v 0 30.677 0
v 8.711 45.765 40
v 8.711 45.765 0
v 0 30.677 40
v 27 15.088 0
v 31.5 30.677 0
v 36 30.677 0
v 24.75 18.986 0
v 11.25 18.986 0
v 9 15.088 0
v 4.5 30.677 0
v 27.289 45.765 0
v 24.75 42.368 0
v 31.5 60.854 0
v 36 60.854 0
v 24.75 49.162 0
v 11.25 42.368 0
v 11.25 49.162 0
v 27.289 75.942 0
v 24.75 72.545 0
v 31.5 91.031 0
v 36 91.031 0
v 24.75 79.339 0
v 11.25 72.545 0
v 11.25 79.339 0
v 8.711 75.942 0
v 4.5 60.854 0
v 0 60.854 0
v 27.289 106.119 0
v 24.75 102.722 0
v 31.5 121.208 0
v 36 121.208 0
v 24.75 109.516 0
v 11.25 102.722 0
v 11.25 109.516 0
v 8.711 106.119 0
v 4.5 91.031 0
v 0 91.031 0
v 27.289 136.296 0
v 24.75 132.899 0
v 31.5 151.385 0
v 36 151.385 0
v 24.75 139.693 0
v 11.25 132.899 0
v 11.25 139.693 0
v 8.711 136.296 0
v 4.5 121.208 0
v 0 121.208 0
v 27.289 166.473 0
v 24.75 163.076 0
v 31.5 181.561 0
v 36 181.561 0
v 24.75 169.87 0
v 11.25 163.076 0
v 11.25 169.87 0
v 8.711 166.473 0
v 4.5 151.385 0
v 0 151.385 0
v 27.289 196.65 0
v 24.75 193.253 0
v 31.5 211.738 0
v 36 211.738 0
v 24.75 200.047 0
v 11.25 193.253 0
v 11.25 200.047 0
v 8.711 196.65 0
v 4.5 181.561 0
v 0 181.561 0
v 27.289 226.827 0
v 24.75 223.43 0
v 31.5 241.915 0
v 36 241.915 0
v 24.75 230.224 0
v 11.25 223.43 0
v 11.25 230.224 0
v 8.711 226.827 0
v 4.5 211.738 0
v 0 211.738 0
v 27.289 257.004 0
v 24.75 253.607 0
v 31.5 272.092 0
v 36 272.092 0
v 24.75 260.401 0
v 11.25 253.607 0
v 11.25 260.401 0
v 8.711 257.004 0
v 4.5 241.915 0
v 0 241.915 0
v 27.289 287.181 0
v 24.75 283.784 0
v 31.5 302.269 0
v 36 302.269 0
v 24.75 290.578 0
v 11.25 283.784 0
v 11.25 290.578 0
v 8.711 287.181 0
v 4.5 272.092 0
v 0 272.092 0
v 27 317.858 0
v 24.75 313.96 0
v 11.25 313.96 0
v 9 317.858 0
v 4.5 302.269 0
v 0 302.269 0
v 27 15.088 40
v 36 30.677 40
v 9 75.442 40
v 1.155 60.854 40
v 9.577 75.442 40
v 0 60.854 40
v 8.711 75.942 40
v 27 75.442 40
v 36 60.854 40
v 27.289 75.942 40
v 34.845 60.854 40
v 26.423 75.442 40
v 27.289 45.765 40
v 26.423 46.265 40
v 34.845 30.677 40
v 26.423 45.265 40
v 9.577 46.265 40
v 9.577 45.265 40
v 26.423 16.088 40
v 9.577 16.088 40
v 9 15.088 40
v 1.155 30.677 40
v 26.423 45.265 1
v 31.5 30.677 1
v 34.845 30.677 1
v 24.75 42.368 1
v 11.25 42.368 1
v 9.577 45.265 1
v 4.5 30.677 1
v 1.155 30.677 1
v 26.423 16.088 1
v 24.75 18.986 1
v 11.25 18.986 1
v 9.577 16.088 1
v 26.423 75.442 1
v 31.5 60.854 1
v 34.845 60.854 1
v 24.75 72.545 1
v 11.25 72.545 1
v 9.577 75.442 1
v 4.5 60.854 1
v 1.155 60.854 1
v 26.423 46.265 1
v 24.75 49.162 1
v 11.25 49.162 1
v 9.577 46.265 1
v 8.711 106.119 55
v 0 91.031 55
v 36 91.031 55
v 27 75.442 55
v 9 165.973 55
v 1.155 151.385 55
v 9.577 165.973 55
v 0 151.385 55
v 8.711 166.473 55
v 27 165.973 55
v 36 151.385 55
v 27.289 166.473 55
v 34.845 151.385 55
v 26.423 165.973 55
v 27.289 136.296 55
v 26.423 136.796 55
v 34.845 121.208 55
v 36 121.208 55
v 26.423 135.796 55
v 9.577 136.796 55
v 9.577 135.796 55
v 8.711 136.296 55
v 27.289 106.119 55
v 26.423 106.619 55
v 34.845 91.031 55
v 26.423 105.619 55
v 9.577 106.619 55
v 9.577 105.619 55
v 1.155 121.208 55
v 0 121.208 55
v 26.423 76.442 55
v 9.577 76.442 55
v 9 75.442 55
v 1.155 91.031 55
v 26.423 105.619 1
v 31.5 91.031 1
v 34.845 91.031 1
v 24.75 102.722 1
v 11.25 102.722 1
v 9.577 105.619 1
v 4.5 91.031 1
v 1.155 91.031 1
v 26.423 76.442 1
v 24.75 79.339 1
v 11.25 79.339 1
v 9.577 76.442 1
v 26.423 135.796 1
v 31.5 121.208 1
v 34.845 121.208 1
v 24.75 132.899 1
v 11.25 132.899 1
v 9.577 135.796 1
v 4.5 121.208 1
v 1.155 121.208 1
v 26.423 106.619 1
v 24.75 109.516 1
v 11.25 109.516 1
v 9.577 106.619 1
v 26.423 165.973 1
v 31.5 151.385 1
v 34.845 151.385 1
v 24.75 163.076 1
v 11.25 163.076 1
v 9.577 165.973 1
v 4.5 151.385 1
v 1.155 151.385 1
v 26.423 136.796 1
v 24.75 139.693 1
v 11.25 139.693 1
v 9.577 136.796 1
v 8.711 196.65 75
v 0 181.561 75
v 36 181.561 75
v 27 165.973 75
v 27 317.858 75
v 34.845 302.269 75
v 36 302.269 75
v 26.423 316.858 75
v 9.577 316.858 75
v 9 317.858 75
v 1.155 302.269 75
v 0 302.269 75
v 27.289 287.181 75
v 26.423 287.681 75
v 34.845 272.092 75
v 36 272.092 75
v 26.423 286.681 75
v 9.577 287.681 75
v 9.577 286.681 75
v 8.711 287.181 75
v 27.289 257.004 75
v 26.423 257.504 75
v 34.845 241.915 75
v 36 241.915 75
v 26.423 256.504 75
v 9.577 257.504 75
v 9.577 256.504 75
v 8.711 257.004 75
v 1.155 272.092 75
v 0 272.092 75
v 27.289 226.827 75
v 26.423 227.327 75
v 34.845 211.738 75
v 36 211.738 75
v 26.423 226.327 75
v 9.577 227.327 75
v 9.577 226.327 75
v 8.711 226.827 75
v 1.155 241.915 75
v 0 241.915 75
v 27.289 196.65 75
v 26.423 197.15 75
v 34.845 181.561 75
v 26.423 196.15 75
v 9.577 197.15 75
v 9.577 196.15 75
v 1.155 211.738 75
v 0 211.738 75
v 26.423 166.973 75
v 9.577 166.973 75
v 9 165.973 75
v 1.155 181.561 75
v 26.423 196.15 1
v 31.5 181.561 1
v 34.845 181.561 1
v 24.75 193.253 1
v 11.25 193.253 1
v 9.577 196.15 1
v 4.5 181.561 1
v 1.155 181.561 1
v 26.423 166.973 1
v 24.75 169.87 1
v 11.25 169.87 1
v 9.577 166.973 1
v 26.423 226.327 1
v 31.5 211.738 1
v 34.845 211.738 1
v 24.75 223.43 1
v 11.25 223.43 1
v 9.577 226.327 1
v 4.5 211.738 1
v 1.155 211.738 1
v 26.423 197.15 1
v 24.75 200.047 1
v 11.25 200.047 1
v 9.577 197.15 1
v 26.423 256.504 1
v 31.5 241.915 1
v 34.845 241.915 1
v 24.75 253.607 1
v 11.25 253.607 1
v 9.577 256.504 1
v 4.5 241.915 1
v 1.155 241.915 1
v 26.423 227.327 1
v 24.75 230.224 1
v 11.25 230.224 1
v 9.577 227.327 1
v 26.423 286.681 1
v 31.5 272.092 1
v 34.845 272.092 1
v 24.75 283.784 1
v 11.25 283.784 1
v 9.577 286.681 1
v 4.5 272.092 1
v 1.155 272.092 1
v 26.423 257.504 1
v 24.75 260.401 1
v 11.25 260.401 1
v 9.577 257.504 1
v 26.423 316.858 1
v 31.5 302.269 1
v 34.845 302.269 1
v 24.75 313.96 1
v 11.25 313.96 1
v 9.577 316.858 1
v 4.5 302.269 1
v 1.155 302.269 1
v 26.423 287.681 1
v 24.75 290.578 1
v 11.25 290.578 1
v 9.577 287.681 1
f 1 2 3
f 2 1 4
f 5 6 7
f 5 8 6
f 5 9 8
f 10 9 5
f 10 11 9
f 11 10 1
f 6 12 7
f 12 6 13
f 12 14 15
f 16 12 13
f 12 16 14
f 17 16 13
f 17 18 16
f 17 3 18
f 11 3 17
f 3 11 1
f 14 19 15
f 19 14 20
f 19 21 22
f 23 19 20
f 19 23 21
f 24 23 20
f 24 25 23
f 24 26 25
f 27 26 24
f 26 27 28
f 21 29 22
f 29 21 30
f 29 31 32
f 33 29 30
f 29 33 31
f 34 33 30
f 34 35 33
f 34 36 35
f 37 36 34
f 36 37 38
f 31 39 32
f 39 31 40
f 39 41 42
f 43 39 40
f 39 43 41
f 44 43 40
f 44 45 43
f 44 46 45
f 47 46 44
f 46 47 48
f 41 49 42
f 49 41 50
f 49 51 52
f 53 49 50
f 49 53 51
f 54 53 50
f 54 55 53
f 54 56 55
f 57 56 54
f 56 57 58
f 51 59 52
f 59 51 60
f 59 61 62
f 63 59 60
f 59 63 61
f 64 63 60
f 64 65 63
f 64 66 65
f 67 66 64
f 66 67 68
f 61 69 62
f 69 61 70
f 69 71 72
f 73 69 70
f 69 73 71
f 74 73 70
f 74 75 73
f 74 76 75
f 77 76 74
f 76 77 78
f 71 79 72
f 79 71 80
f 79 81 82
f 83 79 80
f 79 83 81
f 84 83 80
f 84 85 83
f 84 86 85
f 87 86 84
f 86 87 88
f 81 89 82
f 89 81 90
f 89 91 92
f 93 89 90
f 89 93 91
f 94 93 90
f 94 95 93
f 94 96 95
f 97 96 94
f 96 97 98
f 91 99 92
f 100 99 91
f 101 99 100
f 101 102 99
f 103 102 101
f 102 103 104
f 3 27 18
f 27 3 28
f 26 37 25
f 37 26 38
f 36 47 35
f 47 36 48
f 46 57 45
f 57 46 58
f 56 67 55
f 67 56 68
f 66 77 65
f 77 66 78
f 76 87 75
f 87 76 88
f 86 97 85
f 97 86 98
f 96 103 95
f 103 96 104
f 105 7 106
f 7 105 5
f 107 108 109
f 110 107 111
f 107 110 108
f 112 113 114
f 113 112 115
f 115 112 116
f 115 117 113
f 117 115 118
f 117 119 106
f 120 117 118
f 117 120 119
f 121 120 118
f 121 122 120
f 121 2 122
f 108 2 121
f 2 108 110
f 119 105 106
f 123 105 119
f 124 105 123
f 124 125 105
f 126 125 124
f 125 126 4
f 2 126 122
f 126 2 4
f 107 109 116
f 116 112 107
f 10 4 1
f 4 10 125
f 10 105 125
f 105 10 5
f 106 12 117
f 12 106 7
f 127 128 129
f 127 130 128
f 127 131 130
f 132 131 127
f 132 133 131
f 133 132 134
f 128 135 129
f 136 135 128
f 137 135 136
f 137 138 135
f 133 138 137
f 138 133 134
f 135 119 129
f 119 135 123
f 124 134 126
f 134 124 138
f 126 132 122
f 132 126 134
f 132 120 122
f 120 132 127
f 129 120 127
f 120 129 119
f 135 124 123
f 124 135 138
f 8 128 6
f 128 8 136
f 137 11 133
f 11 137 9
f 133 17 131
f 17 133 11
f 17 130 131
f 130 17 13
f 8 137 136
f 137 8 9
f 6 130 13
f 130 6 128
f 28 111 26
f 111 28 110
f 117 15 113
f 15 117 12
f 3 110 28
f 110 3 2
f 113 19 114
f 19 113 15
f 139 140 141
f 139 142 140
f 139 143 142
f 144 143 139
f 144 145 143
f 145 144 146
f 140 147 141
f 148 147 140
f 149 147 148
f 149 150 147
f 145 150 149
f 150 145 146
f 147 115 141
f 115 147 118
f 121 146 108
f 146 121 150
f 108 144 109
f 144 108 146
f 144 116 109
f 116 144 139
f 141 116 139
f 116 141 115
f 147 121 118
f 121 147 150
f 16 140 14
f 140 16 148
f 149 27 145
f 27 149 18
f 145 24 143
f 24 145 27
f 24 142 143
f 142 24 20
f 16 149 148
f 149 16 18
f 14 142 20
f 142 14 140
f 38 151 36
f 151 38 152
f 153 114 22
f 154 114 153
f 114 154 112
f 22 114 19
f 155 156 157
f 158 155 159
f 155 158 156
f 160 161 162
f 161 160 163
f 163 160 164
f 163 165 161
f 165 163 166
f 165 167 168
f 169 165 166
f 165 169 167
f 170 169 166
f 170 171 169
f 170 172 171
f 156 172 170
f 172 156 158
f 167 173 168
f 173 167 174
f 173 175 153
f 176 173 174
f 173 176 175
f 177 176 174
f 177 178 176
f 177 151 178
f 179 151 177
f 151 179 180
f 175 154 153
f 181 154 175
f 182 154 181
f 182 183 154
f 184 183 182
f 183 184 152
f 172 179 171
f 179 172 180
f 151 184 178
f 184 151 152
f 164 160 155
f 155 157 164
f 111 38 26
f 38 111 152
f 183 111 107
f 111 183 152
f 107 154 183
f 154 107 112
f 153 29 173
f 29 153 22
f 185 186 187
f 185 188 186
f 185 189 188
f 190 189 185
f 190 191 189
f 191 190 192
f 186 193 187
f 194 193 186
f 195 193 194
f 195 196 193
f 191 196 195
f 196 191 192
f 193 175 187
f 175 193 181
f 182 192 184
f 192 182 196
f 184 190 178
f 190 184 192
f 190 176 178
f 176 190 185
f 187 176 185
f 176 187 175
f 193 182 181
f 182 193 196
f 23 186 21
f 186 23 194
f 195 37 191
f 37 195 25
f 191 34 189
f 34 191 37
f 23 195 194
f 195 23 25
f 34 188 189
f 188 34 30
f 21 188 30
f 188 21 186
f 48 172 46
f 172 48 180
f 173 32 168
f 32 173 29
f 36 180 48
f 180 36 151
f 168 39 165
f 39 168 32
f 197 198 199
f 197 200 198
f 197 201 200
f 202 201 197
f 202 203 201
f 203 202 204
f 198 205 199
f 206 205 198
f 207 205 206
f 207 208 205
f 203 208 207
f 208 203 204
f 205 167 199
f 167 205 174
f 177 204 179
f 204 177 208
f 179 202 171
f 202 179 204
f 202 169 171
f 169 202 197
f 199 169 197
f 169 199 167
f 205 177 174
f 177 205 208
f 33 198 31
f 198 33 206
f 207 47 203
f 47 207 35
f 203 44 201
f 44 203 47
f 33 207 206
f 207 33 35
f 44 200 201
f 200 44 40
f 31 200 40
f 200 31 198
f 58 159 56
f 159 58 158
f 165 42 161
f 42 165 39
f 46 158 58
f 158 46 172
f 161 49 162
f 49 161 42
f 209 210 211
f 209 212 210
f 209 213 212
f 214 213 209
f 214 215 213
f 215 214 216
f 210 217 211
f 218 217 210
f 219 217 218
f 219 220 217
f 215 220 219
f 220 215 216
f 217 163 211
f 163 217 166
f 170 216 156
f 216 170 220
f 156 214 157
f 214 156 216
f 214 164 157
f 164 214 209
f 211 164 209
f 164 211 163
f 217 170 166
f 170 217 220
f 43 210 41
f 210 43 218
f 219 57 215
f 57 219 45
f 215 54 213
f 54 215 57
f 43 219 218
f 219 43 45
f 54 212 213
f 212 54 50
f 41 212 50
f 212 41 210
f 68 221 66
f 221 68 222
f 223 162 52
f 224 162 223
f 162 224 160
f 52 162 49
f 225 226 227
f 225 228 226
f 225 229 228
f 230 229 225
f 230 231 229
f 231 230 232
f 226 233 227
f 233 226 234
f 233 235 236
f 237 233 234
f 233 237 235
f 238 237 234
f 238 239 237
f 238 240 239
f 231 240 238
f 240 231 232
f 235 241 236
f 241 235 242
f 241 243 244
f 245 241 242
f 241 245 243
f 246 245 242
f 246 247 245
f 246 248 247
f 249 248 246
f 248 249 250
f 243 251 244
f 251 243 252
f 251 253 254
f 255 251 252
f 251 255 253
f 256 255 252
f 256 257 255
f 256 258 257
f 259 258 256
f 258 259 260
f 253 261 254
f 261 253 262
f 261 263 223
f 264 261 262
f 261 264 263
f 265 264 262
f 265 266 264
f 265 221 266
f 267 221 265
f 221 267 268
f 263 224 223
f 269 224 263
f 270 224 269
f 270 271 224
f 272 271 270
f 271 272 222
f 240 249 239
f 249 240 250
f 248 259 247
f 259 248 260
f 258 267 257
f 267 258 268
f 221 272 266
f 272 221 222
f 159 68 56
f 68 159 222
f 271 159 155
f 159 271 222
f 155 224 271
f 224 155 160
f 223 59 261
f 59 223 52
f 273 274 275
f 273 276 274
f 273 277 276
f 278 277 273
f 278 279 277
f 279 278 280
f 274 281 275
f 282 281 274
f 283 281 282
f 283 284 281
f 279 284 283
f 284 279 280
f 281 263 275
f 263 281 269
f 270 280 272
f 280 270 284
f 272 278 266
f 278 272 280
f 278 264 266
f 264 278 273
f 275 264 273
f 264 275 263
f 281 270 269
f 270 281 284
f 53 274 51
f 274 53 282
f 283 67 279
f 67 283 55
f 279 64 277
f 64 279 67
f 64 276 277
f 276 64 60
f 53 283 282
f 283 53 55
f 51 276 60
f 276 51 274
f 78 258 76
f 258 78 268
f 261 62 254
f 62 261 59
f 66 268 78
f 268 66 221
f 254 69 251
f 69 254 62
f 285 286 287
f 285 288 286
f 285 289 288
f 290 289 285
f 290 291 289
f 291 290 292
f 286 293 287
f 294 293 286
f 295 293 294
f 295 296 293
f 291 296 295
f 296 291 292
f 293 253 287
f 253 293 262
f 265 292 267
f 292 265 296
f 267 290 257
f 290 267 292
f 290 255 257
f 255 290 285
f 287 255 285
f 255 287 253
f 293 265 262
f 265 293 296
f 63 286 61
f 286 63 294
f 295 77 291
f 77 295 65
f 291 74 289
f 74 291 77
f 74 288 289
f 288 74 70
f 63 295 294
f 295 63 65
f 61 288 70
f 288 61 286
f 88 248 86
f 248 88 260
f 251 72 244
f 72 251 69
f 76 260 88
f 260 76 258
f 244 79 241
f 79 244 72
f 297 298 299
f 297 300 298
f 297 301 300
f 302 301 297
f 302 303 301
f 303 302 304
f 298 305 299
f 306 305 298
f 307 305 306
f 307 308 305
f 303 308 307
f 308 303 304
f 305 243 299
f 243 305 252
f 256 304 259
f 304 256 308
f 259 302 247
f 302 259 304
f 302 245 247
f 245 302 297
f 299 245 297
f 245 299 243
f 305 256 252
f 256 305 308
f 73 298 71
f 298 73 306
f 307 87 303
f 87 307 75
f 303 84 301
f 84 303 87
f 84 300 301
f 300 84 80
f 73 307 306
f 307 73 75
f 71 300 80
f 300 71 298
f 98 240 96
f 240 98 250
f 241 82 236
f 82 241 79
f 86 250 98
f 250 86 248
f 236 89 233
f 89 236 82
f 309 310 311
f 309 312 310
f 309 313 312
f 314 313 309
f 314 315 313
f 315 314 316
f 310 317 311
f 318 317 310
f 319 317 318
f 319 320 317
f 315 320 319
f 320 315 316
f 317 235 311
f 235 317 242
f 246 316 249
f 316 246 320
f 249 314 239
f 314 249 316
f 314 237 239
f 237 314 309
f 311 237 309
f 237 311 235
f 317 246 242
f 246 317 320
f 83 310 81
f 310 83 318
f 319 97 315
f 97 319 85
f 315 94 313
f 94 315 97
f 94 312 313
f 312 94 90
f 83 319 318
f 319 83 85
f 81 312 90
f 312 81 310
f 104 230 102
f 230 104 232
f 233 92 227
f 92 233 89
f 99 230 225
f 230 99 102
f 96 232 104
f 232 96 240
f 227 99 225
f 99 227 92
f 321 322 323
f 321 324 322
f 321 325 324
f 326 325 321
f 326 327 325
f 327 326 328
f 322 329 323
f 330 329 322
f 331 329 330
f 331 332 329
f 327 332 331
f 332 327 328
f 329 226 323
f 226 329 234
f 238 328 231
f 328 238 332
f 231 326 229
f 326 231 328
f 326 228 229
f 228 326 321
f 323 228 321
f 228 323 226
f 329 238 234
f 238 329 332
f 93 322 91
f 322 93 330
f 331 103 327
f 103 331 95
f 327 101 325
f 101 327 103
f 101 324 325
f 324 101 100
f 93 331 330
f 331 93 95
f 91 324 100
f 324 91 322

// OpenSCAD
/* ************************************************************
   * Author: Peter Oehlert
   * Copyright 2017
   * 
   * 
   * This work is licensed under a Creative Commons 
   * Attribution-NonCommercial-ShareAlike 4.0 International 
   * License.
   ***********************************************************/

Side = 18;
Wall = 1;
BottomCutout = Side*.75;

ConfigArray = [
    [true],
    [true],
    [true],
    [true],
    [true],
    [true],
    [true],
    [true],
    [true],
    [true],
];

HeightArray = [
    [75],
    [75],
    [75],
    [75],
    [75],
    [55],
    [55],
    [55],
    [40],
    [40],
];


// --------------------------------------------------------
// - Do not modify constants below this line
// --------------------------------------------------------

Cos0 = 1;
// Using degrees, PI = 180 degrees
Pi = 180;
TwoPi = 2*Pi;
Unit = TwoPi/6; // we're a hexagon

// from SOHCAHTOA, wall is the actual wall, so 
// wall/sin(Unit) is the amount of the radius different
// between the circle enclosing the outside hexagon and 
// the circle enclosing the inside hexagon
RadiusDifference = (Wall/sin(Unit));

function reverse(array) = 
    let(arrLen = len(array)-1)
    [ for (i = [0:arrLen]) array[arrLen-i] ];


// get hex polygon points, using unit circle
function rawHexPoints(side) = [
    for (idx = [0:6]) 
        side *[ cos( TwoPi/6 * idx ), sin( TwoPi/6 * idx ) ] 
];
    
 // get translation vector to originate at 0,0
 function translateRawHex(points) = [
    abs(min( [for(idx = points) idx[0]] )),
    abs(min( [for(idx = points) idx[1]] ))
];

// get hexagon points originating at 0,0
function hexPoints(side) = 
    let( points = rawHexPoints(side),
        trans = translateRawHex(points) )
    [ for (i = points) trans + i ];


// assemble a complete hex cell
module hexCell(side, height, wall, bottomCutout) {
    
    difference() {
        // get outside hex poly
        linear_extrude(height)
        polygon(hexPoints(side));
        
        // remove inner guts
        translate([RadiusDifference,wall,wall])
        linear_extrude(height-wall)
        polygon(hexPoints(side-RadiusDifference));
        
        // poke hole in the bottom
        translate([side-bottomCutout, side*sin(Unit)-bottomCutout*sin(Unit)])
        linear_extrude(height)
        polygon(hexPoints(bottomCutout));
    }
}

module honeyComb(side, wall, bottomCutout, config, heights) {
    
    

    // function of 2 right triangles, using wall as a basis
    //   the 3rd side of wall/radiusDifference becomes the 
    //   hypotenuse of a second triangle, which is used to 
    //   determine the "peak" of the hexagon
    peakSize = wall*cos(Unit)*tan(30);
    
    // get height, width, and row offsets
    objectHeight    = side*2*sin(Unit);
    columnWidth = 
        Cos0*Side + cos(Unit)*(Side-RadiusDifference)-peakSize;
    evenRowOffset = (objectHeight-Wall)/2;     
    
    // reverse arrays so visual layout of array
    //   is the same as visual layout of honeycomb
    rconfig = reverse(config);
    rheights = reverse(heights);
    
    for (row = [0:len(rconfig)])
    for (col = [0:len(rconfig[row])]) {
        
        if (rconfig[row][col]) {
            translate([
                col*columnWidth, 
                row*(objectHeight-wall)
                    + ( (0 == col%2) ? evenRowOffset : 0) 
            ])
            hexCell(side, rheights[row][col], wall, bottomCutout);
        }
    }
}

honeyComb(Side, Wall, BottomCutout, ConfigArray, HeightArray);
